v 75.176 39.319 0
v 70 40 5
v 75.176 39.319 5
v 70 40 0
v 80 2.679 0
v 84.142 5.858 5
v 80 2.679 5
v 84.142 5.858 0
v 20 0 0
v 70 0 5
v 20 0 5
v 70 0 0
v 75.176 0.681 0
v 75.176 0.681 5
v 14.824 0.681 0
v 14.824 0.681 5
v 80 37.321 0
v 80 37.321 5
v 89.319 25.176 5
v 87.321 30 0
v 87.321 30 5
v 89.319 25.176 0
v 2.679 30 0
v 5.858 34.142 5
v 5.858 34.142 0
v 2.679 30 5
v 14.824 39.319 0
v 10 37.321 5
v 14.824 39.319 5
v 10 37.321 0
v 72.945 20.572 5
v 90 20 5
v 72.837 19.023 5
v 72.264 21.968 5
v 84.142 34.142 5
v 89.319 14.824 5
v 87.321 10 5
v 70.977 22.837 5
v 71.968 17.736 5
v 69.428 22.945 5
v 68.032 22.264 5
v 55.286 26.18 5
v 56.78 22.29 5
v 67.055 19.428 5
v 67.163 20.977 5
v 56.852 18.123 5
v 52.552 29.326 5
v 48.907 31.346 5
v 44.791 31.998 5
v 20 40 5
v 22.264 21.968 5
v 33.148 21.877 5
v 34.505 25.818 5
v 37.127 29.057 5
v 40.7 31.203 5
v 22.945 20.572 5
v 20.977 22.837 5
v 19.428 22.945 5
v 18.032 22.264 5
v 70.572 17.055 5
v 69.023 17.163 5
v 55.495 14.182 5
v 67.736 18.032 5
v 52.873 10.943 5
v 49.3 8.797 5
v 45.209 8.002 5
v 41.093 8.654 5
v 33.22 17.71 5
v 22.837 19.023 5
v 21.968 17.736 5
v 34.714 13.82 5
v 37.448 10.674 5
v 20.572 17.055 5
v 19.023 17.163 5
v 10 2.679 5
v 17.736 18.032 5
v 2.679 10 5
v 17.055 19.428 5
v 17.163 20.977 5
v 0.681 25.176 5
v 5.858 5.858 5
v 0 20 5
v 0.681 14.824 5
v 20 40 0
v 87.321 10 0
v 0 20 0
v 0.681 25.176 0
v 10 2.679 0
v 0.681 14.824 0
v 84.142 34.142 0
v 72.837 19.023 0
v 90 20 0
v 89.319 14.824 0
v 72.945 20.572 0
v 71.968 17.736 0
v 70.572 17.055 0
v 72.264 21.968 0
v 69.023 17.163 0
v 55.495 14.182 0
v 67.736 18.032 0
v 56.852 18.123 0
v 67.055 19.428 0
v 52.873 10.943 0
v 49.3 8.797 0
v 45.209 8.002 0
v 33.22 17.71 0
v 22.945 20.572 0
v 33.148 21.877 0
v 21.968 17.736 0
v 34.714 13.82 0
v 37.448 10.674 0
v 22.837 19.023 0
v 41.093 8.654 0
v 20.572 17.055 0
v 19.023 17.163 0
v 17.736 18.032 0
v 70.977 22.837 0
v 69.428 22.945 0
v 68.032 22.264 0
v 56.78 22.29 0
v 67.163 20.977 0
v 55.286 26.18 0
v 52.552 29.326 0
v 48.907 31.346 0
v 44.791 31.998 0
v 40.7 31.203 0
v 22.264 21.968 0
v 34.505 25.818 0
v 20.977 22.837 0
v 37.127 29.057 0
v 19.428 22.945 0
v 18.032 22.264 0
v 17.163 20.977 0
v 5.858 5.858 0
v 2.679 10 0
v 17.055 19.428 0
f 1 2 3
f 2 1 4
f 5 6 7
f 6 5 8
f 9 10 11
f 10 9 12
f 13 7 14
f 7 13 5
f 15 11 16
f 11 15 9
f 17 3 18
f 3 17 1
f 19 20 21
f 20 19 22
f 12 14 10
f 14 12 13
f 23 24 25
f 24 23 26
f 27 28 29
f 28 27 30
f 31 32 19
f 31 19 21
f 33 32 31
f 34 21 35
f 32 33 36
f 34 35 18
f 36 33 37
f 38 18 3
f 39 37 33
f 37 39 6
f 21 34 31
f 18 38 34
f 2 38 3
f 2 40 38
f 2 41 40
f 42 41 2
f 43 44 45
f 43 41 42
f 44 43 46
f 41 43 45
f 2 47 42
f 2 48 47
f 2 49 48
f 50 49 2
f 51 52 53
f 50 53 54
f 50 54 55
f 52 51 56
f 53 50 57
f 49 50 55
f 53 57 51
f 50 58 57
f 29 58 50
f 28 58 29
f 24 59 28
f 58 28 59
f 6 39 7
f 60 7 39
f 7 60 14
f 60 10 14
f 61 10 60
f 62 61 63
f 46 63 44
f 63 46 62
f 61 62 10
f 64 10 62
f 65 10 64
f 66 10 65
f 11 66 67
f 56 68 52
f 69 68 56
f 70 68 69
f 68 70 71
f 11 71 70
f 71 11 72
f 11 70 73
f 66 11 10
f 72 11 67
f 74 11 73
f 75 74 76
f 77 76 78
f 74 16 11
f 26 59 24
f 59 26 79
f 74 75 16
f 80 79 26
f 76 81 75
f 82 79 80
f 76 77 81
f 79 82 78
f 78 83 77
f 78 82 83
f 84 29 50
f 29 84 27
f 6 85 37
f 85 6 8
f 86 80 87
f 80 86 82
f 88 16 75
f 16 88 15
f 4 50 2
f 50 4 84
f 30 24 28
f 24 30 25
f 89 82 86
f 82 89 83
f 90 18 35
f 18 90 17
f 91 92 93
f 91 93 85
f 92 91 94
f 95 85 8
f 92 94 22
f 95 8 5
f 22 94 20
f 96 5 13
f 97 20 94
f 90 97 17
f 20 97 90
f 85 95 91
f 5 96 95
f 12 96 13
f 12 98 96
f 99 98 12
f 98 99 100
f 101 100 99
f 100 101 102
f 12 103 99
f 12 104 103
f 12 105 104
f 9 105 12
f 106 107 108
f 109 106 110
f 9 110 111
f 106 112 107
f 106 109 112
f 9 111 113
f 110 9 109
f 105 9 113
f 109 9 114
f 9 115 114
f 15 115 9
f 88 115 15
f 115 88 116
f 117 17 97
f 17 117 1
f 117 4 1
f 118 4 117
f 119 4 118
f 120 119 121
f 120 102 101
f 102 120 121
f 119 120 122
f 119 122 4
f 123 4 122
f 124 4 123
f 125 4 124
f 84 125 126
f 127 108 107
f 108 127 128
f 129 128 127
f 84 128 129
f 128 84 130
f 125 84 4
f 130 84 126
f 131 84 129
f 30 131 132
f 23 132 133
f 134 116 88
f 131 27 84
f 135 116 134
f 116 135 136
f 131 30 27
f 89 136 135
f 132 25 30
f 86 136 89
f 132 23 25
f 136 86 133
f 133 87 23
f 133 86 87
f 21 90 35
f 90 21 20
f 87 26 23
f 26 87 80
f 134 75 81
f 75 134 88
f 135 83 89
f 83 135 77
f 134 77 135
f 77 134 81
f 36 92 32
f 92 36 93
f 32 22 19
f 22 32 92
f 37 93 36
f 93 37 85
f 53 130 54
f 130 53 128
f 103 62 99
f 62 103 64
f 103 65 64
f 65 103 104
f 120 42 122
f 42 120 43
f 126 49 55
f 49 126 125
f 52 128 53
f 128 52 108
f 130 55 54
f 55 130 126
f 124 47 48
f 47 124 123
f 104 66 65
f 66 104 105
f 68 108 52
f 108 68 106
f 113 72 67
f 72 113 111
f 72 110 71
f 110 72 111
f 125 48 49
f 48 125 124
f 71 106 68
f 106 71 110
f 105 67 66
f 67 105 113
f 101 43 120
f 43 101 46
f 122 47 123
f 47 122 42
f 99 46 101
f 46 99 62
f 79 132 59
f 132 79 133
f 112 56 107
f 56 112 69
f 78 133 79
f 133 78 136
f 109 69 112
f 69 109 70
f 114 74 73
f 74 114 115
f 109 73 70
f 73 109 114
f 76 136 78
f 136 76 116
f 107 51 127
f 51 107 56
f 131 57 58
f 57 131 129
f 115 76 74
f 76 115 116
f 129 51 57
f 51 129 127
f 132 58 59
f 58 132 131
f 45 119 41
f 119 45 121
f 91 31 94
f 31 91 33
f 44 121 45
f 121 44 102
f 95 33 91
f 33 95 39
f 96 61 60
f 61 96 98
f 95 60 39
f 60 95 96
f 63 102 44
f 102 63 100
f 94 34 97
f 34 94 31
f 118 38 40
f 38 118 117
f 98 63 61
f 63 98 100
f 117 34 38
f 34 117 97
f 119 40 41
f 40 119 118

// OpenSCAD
$fn = 32;

// ----------------------------------------------------------------------
// Spacer plate: obround span 50, caps R20
// ----------------------------------------------------------------------

// --- parameters (mm) ---
bore_r = 12;              // centre bore radius
bolt_r = 3;               // bolt hole radius
plate_t = 5;              // plate thickness, Z (extrusion height)
span = 50;                // obround span
cap_r = 20;               // cap radius

profile = [[20, 40], [14.824, 39.319], [10, 37.321], [5.858, 34.142], [2.679, 30], [0.681, 25.176], [0, 20], [0.681, 14.824], [2.679, 10], [5.858, 5.858], [10, 2.679], [14.824, 0.681], [20, 0], [70, 0], [75.176, 0.681], [80, 2.679], [84.142, 5.858], [87.321, 10], [89.319, 14.824], [90, 20], [89.319, 25.176], [87.321, 30], [84.142, 34.142], [80, 37.321], [75.176, 39.319], [70, 40]];  // primary outline, 26 points, counter clockwise
void_1 = [[56.78, 22.29], [55.286, 26.18], [52.552, 29.326], [48.907, 31.346], [44.791, 31.998], [40.7, 31.203], [37.127, 29.057], [34.505, 25.818], [33.148, 21.877], [33.22, 17.71], [34.714, 13.82], [37.448, 10.674], [41.093, 8.654], [45.209, 8.002], [49.3, 8.797], [52.873, 10.943], [55.495, 14.182], [56.852, 18.123]];  // centre bore, 18 points
void_2 = [[22.945, 20.572], [22.264, 21.968], [20.977, 22.837], [19.428, 22.945], [18.032, 22.264], [17.163, 20.977], [17.055, 19.428], [17.736, 18.032], [19.023, 17.163], [20.572, 17.055], [21.968, 17.736], [22.837, 19.023]];  // end hole, 12 points
void_3 = [[72.945, 20.572], [72.264, 21.968], [70.977, 22.837], [69.428, 22.945], [68.032, 22.264], [67.163, 20.977], [67.055, 19.428], [67.736, 18.032], [69.023, 17.163], [70.572, 17.055], [71.968, 17.736], [72.837, 19.023]];  // end hole, 12 points

// --- the one profile operation ---
difference() {
  linear_extrude(height = plate_t) polygon(points = profile);
  translate([0, 0, -1])
    linear_extrude(height = plate_t + 2) polygon(points = void_1);
  translate([0, 0, -1])
    linear_extrude(height = plate_t + 2) polygon(points = void_2);
  translate([0, 0, -1])
    linear_extrude(height = plate_t + 2) polygon(points = void_3);
}
